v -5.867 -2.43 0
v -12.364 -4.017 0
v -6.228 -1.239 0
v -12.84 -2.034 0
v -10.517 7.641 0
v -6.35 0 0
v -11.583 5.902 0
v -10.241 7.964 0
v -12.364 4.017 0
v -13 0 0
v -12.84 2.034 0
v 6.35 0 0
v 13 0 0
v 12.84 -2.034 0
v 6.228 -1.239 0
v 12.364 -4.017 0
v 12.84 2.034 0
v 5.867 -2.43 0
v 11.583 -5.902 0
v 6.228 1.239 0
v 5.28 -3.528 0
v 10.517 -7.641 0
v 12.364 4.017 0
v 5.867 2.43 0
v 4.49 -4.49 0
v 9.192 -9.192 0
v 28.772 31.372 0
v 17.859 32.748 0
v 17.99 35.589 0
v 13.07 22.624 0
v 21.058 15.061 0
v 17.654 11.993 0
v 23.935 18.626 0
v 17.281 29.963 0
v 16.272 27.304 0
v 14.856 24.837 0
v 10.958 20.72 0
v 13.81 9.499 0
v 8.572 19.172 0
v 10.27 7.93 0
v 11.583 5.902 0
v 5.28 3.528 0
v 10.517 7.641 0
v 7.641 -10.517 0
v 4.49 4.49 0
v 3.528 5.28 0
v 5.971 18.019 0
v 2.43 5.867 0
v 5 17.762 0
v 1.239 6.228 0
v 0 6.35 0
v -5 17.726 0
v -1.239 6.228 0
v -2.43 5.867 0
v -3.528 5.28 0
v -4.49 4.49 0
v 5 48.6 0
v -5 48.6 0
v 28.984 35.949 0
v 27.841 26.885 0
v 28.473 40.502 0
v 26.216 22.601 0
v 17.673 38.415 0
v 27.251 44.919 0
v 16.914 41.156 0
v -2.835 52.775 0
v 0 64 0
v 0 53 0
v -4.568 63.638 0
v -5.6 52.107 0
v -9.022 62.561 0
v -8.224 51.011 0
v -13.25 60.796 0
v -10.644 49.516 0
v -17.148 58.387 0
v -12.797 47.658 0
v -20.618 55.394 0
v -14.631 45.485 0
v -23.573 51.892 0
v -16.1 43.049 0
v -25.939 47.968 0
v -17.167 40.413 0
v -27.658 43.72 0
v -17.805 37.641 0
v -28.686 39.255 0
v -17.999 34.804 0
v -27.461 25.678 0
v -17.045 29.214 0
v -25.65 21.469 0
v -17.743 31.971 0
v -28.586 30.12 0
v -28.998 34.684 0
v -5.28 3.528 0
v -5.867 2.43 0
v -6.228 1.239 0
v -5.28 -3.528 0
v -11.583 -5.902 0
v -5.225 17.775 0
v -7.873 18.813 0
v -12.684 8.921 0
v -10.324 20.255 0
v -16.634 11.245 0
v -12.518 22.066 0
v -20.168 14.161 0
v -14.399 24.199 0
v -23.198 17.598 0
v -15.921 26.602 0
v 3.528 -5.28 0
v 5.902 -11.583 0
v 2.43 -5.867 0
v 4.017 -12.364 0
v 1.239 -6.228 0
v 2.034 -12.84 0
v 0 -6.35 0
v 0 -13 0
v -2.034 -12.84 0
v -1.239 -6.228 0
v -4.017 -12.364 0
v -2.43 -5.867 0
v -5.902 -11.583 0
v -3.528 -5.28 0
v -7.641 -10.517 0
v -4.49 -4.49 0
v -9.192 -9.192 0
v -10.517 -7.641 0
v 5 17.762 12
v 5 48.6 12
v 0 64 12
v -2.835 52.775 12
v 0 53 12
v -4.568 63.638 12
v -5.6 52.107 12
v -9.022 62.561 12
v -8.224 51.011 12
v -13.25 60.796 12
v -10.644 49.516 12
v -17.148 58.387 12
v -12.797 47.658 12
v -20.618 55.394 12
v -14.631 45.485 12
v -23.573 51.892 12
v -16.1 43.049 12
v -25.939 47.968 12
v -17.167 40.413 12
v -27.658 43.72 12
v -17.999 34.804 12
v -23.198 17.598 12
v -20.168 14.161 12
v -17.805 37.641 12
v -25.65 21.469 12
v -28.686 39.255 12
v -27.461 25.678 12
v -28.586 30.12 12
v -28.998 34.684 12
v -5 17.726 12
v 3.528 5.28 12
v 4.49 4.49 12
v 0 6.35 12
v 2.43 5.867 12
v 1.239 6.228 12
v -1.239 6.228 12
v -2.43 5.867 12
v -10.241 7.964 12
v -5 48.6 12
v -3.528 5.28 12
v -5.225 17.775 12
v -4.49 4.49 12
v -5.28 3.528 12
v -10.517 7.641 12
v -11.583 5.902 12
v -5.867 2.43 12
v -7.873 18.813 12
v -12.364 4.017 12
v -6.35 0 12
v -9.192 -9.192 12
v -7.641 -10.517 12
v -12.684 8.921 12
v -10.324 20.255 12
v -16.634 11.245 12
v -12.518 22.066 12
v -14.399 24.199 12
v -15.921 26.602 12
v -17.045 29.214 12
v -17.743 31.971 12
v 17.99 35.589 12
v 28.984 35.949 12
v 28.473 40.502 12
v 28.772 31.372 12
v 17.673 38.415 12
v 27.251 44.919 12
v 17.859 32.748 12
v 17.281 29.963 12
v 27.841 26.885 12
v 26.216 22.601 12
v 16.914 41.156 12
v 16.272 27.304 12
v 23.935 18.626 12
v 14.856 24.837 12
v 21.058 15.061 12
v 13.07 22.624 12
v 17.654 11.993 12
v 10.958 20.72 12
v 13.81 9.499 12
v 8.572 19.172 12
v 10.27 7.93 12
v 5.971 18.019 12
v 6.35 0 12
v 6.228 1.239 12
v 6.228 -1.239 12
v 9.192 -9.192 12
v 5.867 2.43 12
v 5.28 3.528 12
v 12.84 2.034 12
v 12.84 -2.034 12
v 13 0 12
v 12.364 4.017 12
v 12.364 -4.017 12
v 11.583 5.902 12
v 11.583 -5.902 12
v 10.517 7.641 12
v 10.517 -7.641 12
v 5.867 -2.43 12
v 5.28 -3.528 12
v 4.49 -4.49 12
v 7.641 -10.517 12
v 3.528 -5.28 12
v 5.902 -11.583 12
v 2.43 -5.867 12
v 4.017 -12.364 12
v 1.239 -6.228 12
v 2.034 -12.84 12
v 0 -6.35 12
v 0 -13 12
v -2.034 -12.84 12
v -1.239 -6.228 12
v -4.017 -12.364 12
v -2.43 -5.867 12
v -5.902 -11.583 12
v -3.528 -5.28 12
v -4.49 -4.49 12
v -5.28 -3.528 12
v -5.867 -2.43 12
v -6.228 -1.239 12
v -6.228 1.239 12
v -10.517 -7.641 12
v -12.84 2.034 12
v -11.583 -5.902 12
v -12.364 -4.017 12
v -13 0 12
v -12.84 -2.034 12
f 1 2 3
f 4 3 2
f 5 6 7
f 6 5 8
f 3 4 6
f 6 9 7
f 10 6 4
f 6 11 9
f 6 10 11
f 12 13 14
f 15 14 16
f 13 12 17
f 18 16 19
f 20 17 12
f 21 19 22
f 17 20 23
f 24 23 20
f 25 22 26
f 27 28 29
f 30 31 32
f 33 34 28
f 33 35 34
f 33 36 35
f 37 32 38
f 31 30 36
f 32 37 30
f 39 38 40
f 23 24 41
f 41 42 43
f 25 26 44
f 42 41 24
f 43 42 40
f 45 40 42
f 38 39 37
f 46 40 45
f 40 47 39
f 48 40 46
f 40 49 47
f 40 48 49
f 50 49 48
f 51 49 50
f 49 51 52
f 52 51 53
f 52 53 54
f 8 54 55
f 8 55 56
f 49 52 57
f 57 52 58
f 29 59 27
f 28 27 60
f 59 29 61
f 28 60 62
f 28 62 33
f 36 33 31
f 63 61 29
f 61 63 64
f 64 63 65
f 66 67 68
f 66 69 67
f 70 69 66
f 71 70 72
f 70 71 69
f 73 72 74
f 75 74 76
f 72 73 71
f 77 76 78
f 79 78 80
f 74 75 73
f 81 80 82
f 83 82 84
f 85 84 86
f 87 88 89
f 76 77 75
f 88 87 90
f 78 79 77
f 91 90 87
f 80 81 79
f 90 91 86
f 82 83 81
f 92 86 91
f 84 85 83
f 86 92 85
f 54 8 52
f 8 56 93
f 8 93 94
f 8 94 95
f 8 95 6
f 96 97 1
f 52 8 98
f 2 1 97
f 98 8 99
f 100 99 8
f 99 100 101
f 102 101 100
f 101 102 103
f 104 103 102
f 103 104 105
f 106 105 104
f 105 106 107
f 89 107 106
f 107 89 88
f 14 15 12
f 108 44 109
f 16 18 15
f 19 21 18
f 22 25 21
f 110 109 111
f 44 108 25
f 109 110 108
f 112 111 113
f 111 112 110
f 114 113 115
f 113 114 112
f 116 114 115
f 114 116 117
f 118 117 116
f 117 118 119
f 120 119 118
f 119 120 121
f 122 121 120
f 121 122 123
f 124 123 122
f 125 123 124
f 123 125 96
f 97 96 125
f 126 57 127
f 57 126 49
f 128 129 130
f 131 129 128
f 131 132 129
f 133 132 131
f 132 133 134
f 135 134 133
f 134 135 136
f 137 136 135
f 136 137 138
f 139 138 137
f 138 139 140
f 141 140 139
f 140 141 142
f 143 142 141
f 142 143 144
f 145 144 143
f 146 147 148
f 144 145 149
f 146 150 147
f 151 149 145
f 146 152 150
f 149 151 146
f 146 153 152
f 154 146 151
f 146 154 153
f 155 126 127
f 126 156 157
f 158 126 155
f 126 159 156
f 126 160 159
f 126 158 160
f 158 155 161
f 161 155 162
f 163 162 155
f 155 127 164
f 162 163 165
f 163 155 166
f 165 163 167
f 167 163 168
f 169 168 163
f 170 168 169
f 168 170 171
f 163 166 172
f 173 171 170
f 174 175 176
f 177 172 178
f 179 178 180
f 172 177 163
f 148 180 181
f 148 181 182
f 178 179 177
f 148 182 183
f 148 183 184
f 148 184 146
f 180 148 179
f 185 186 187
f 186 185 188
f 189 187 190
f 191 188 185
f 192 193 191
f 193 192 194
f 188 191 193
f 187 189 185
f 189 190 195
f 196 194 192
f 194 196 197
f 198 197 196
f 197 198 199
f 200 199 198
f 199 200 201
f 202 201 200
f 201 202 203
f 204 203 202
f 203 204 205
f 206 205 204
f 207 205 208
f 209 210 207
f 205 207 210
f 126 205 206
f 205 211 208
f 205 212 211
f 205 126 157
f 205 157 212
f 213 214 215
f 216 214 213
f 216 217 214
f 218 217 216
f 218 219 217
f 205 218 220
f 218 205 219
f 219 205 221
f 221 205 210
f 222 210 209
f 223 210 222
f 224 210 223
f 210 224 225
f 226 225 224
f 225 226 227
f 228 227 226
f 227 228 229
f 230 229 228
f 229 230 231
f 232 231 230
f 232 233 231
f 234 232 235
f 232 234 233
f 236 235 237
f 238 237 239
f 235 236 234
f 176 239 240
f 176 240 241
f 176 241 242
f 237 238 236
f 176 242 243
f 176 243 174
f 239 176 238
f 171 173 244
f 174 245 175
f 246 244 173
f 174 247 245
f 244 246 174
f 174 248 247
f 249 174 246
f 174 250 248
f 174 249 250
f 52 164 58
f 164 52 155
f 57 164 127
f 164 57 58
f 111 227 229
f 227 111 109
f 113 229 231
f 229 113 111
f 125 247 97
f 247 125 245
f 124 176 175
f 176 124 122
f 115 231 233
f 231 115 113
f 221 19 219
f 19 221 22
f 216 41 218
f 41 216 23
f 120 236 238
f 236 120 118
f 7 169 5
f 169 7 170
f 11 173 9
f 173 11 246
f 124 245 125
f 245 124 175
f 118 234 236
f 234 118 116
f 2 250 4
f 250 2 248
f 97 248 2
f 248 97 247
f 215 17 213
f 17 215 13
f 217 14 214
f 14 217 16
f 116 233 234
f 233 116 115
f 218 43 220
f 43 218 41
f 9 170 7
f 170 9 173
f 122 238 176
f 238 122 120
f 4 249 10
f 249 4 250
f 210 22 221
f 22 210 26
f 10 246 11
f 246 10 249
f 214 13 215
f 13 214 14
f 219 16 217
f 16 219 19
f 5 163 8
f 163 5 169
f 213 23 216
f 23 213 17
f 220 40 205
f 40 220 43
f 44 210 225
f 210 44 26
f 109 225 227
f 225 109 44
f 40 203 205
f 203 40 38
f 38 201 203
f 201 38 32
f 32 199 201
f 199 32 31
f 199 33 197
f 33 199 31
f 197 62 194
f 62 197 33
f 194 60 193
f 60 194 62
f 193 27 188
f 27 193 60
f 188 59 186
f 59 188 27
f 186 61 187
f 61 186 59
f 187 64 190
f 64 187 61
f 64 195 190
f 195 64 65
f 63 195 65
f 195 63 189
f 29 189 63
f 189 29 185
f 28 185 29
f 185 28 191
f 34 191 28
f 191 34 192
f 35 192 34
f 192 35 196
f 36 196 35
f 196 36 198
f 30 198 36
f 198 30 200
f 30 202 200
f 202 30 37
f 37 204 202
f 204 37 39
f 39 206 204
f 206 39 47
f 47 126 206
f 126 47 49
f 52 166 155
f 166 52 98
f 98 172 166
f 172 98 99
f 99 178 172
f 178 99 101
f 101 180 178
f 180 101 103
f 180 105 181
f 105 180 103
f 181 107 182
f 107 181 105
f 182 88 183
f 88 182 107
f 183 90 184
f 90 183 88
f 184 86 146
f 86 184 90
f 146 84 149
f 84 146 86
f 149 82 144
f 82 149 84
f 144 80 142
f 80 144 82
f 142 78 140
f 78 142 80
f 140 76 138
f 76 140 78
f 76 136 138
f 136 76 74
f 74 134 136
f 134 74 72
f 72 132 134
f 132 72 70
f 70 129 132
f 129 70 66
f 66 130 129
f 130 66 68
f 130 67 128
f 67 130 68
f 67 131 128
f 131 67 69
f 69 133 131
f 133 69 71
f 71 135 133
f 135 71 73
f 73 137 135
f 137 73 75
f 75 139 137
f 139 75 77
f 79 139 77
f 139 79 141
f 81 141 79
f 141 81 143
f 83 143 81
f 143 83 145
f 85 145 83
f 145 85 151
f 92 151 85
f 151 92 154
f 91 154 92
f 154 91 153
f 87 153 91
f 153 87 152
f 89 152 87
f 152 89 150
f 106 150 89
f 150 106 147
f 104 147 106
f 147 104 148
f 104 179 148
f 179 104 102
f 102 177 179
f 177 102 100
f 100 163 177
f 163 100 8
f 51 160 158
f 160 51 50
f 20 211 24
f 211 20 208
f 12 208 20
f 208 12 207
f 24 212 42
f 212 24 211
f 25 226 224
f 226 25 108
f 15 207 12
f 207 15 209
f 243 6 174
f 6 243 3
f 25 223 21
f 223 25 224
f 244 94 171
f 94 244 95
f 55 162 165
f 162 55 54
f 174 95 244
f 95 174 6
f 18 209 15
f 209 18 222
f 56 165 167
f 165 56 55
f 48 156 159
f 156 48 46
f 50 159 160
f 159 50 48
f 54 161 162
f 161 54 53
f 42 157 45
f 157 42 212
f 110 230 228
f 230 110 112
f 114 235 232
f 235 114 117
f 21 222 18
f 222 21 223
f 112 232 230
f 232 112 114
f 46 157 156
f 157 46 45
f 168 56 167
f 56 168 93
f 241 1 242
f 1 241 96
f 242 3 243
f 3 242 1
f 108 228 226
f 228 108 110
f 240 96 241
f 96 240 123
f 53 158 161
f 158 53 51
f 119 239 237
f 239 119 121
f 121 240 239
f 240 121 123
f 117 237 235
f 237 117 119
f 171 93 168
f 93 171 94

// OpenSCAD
$fn = 32;

// ----------------------------------------------------------------------
// Hook: 70 mm shank into a 18 mm curl, 12 mm thick
// ----------------------------------------------------------------------

// --- parameters (mm) ---
shank_len = 70;           // shank length from the boss centre
shank_w = 10;             // shank width
boss_d = 26;              // boss diameter
bore_d = 12.7;            // boss bore
curl_in = 18;             // curl inner radius
curl_out = 29;            // curl outer radius
curl_sweep = 290;         // curl sweep angle
hook_t = 12;              // hook thickness

shank_profile = [[-5, 48.6], [5, 48.6], [5, 11], [-5, 11]];
boss_profile = [[13, 0], [12.84, 2.034], [12.364, 4.017], [11.583, 5.902], [10.517, 7.641], [9.192, 9.192], [7.641, 10.517], [5.902, 11.583], [4.017, 12.364], [2.034, 12.84], [0, 13], [-2.034, 12.84], [-4.017, 12.364], [-5.902, 11.583], [-7.641, 10.517], [-9.192, 9.192], [-10.517, 7.641], [-11.583, 5.902], [-12.364, 4.017], [-12.84, 2.034], [-13, 0], [-12.84, -2.034], [-12.364, -4.017], [-11.583, -5.902], [-10.517, -7.641], [-9.192, -9.192], [-7.641, -10.517], [-5.902, -11.583], [-4.017, -12.364], [-2.034, -12.84], [0, -13], [2.034, -12.84], [4.017, -12.364], [5.902, -11.583], [7.641, -10.517], [9.192, -9.192], [10.517, -7.641], [11.583, -5.902], [12.364, -4.017], [12.84, -2.034]];
curl_profile = [[0, 64], [-4.568, 63.638], [-9.022, 62.561], [-13.25, 60.796], [-17.148, 58.387], [-20.618, 55.394], [-23.573, 51.892], [-25.939, 47.968], [-27.658, 43.72], [-28.686, 39.255], [-28.998, 34.684], [-28.586, 30.12], [-27.461, 25.678], [-25.65, 21.469], [-23.198, 17.598], [-20.168, 14.161], [-16.634, 11.245], [-12.684, 8.921], [-8.418, 7.249], [-3.942, 6.269], [0.633, 6.007], [5.191, 6.468], [9.621, 7.642], [13.81, 9.499], [17.654, 11.993], [21.058, 15.061], [23.935, 18.626], [26.216, 22.601], [27.841, 26.885], [28.772, 31.372], [28.984, 35.949], [28.473, 40.502], [27.251, 44.919], [16.914, 41.156], [17.673, 38.415], [17.99, 35.589], [17.859, 32.748], [17.281, 29.963], [16.272, 27.304], [14.856, 24.837], [13.07, 22.624], [10.958, 20.72], [8.572, 19.172], [5.971, 18.019], [3.222, 17.291], [0.393, 17.004], [-2.447, 17.167], [-5.225, 17.775], [-7.873, 18.813], [-10.324, 20.255], [-12.518, 22.066], [-14.399, 24.199], [-15.921, 26.602], [-17.045, 29.214], [-17.743, 31.971], [-17.999, 34.804], [-17.805, 37.641], [-17.167, 40.413], [-16.1, 43.049], [-14.631, 45.485], [-12.797, 47.658], [-10.644, 49.516], [-8.224, 51.011], [-5.6, 52.107], [-2.835, 52.775], [0, 53]];

difference() {
  union() {
    /* three overlapping outlines: shank, boss and the smooth curl */
    linear_extrude(height = hook_t) polygon(shank_profile);
    linear_extrude(height = hook_t) polygon(boss_profile);
    linear_extrude(height = hook_t) polygon(curl_profile);
  }
  translate([0, 0, -2.5]) cylinder(h = hook_t + 5, d = bore_d);
}
